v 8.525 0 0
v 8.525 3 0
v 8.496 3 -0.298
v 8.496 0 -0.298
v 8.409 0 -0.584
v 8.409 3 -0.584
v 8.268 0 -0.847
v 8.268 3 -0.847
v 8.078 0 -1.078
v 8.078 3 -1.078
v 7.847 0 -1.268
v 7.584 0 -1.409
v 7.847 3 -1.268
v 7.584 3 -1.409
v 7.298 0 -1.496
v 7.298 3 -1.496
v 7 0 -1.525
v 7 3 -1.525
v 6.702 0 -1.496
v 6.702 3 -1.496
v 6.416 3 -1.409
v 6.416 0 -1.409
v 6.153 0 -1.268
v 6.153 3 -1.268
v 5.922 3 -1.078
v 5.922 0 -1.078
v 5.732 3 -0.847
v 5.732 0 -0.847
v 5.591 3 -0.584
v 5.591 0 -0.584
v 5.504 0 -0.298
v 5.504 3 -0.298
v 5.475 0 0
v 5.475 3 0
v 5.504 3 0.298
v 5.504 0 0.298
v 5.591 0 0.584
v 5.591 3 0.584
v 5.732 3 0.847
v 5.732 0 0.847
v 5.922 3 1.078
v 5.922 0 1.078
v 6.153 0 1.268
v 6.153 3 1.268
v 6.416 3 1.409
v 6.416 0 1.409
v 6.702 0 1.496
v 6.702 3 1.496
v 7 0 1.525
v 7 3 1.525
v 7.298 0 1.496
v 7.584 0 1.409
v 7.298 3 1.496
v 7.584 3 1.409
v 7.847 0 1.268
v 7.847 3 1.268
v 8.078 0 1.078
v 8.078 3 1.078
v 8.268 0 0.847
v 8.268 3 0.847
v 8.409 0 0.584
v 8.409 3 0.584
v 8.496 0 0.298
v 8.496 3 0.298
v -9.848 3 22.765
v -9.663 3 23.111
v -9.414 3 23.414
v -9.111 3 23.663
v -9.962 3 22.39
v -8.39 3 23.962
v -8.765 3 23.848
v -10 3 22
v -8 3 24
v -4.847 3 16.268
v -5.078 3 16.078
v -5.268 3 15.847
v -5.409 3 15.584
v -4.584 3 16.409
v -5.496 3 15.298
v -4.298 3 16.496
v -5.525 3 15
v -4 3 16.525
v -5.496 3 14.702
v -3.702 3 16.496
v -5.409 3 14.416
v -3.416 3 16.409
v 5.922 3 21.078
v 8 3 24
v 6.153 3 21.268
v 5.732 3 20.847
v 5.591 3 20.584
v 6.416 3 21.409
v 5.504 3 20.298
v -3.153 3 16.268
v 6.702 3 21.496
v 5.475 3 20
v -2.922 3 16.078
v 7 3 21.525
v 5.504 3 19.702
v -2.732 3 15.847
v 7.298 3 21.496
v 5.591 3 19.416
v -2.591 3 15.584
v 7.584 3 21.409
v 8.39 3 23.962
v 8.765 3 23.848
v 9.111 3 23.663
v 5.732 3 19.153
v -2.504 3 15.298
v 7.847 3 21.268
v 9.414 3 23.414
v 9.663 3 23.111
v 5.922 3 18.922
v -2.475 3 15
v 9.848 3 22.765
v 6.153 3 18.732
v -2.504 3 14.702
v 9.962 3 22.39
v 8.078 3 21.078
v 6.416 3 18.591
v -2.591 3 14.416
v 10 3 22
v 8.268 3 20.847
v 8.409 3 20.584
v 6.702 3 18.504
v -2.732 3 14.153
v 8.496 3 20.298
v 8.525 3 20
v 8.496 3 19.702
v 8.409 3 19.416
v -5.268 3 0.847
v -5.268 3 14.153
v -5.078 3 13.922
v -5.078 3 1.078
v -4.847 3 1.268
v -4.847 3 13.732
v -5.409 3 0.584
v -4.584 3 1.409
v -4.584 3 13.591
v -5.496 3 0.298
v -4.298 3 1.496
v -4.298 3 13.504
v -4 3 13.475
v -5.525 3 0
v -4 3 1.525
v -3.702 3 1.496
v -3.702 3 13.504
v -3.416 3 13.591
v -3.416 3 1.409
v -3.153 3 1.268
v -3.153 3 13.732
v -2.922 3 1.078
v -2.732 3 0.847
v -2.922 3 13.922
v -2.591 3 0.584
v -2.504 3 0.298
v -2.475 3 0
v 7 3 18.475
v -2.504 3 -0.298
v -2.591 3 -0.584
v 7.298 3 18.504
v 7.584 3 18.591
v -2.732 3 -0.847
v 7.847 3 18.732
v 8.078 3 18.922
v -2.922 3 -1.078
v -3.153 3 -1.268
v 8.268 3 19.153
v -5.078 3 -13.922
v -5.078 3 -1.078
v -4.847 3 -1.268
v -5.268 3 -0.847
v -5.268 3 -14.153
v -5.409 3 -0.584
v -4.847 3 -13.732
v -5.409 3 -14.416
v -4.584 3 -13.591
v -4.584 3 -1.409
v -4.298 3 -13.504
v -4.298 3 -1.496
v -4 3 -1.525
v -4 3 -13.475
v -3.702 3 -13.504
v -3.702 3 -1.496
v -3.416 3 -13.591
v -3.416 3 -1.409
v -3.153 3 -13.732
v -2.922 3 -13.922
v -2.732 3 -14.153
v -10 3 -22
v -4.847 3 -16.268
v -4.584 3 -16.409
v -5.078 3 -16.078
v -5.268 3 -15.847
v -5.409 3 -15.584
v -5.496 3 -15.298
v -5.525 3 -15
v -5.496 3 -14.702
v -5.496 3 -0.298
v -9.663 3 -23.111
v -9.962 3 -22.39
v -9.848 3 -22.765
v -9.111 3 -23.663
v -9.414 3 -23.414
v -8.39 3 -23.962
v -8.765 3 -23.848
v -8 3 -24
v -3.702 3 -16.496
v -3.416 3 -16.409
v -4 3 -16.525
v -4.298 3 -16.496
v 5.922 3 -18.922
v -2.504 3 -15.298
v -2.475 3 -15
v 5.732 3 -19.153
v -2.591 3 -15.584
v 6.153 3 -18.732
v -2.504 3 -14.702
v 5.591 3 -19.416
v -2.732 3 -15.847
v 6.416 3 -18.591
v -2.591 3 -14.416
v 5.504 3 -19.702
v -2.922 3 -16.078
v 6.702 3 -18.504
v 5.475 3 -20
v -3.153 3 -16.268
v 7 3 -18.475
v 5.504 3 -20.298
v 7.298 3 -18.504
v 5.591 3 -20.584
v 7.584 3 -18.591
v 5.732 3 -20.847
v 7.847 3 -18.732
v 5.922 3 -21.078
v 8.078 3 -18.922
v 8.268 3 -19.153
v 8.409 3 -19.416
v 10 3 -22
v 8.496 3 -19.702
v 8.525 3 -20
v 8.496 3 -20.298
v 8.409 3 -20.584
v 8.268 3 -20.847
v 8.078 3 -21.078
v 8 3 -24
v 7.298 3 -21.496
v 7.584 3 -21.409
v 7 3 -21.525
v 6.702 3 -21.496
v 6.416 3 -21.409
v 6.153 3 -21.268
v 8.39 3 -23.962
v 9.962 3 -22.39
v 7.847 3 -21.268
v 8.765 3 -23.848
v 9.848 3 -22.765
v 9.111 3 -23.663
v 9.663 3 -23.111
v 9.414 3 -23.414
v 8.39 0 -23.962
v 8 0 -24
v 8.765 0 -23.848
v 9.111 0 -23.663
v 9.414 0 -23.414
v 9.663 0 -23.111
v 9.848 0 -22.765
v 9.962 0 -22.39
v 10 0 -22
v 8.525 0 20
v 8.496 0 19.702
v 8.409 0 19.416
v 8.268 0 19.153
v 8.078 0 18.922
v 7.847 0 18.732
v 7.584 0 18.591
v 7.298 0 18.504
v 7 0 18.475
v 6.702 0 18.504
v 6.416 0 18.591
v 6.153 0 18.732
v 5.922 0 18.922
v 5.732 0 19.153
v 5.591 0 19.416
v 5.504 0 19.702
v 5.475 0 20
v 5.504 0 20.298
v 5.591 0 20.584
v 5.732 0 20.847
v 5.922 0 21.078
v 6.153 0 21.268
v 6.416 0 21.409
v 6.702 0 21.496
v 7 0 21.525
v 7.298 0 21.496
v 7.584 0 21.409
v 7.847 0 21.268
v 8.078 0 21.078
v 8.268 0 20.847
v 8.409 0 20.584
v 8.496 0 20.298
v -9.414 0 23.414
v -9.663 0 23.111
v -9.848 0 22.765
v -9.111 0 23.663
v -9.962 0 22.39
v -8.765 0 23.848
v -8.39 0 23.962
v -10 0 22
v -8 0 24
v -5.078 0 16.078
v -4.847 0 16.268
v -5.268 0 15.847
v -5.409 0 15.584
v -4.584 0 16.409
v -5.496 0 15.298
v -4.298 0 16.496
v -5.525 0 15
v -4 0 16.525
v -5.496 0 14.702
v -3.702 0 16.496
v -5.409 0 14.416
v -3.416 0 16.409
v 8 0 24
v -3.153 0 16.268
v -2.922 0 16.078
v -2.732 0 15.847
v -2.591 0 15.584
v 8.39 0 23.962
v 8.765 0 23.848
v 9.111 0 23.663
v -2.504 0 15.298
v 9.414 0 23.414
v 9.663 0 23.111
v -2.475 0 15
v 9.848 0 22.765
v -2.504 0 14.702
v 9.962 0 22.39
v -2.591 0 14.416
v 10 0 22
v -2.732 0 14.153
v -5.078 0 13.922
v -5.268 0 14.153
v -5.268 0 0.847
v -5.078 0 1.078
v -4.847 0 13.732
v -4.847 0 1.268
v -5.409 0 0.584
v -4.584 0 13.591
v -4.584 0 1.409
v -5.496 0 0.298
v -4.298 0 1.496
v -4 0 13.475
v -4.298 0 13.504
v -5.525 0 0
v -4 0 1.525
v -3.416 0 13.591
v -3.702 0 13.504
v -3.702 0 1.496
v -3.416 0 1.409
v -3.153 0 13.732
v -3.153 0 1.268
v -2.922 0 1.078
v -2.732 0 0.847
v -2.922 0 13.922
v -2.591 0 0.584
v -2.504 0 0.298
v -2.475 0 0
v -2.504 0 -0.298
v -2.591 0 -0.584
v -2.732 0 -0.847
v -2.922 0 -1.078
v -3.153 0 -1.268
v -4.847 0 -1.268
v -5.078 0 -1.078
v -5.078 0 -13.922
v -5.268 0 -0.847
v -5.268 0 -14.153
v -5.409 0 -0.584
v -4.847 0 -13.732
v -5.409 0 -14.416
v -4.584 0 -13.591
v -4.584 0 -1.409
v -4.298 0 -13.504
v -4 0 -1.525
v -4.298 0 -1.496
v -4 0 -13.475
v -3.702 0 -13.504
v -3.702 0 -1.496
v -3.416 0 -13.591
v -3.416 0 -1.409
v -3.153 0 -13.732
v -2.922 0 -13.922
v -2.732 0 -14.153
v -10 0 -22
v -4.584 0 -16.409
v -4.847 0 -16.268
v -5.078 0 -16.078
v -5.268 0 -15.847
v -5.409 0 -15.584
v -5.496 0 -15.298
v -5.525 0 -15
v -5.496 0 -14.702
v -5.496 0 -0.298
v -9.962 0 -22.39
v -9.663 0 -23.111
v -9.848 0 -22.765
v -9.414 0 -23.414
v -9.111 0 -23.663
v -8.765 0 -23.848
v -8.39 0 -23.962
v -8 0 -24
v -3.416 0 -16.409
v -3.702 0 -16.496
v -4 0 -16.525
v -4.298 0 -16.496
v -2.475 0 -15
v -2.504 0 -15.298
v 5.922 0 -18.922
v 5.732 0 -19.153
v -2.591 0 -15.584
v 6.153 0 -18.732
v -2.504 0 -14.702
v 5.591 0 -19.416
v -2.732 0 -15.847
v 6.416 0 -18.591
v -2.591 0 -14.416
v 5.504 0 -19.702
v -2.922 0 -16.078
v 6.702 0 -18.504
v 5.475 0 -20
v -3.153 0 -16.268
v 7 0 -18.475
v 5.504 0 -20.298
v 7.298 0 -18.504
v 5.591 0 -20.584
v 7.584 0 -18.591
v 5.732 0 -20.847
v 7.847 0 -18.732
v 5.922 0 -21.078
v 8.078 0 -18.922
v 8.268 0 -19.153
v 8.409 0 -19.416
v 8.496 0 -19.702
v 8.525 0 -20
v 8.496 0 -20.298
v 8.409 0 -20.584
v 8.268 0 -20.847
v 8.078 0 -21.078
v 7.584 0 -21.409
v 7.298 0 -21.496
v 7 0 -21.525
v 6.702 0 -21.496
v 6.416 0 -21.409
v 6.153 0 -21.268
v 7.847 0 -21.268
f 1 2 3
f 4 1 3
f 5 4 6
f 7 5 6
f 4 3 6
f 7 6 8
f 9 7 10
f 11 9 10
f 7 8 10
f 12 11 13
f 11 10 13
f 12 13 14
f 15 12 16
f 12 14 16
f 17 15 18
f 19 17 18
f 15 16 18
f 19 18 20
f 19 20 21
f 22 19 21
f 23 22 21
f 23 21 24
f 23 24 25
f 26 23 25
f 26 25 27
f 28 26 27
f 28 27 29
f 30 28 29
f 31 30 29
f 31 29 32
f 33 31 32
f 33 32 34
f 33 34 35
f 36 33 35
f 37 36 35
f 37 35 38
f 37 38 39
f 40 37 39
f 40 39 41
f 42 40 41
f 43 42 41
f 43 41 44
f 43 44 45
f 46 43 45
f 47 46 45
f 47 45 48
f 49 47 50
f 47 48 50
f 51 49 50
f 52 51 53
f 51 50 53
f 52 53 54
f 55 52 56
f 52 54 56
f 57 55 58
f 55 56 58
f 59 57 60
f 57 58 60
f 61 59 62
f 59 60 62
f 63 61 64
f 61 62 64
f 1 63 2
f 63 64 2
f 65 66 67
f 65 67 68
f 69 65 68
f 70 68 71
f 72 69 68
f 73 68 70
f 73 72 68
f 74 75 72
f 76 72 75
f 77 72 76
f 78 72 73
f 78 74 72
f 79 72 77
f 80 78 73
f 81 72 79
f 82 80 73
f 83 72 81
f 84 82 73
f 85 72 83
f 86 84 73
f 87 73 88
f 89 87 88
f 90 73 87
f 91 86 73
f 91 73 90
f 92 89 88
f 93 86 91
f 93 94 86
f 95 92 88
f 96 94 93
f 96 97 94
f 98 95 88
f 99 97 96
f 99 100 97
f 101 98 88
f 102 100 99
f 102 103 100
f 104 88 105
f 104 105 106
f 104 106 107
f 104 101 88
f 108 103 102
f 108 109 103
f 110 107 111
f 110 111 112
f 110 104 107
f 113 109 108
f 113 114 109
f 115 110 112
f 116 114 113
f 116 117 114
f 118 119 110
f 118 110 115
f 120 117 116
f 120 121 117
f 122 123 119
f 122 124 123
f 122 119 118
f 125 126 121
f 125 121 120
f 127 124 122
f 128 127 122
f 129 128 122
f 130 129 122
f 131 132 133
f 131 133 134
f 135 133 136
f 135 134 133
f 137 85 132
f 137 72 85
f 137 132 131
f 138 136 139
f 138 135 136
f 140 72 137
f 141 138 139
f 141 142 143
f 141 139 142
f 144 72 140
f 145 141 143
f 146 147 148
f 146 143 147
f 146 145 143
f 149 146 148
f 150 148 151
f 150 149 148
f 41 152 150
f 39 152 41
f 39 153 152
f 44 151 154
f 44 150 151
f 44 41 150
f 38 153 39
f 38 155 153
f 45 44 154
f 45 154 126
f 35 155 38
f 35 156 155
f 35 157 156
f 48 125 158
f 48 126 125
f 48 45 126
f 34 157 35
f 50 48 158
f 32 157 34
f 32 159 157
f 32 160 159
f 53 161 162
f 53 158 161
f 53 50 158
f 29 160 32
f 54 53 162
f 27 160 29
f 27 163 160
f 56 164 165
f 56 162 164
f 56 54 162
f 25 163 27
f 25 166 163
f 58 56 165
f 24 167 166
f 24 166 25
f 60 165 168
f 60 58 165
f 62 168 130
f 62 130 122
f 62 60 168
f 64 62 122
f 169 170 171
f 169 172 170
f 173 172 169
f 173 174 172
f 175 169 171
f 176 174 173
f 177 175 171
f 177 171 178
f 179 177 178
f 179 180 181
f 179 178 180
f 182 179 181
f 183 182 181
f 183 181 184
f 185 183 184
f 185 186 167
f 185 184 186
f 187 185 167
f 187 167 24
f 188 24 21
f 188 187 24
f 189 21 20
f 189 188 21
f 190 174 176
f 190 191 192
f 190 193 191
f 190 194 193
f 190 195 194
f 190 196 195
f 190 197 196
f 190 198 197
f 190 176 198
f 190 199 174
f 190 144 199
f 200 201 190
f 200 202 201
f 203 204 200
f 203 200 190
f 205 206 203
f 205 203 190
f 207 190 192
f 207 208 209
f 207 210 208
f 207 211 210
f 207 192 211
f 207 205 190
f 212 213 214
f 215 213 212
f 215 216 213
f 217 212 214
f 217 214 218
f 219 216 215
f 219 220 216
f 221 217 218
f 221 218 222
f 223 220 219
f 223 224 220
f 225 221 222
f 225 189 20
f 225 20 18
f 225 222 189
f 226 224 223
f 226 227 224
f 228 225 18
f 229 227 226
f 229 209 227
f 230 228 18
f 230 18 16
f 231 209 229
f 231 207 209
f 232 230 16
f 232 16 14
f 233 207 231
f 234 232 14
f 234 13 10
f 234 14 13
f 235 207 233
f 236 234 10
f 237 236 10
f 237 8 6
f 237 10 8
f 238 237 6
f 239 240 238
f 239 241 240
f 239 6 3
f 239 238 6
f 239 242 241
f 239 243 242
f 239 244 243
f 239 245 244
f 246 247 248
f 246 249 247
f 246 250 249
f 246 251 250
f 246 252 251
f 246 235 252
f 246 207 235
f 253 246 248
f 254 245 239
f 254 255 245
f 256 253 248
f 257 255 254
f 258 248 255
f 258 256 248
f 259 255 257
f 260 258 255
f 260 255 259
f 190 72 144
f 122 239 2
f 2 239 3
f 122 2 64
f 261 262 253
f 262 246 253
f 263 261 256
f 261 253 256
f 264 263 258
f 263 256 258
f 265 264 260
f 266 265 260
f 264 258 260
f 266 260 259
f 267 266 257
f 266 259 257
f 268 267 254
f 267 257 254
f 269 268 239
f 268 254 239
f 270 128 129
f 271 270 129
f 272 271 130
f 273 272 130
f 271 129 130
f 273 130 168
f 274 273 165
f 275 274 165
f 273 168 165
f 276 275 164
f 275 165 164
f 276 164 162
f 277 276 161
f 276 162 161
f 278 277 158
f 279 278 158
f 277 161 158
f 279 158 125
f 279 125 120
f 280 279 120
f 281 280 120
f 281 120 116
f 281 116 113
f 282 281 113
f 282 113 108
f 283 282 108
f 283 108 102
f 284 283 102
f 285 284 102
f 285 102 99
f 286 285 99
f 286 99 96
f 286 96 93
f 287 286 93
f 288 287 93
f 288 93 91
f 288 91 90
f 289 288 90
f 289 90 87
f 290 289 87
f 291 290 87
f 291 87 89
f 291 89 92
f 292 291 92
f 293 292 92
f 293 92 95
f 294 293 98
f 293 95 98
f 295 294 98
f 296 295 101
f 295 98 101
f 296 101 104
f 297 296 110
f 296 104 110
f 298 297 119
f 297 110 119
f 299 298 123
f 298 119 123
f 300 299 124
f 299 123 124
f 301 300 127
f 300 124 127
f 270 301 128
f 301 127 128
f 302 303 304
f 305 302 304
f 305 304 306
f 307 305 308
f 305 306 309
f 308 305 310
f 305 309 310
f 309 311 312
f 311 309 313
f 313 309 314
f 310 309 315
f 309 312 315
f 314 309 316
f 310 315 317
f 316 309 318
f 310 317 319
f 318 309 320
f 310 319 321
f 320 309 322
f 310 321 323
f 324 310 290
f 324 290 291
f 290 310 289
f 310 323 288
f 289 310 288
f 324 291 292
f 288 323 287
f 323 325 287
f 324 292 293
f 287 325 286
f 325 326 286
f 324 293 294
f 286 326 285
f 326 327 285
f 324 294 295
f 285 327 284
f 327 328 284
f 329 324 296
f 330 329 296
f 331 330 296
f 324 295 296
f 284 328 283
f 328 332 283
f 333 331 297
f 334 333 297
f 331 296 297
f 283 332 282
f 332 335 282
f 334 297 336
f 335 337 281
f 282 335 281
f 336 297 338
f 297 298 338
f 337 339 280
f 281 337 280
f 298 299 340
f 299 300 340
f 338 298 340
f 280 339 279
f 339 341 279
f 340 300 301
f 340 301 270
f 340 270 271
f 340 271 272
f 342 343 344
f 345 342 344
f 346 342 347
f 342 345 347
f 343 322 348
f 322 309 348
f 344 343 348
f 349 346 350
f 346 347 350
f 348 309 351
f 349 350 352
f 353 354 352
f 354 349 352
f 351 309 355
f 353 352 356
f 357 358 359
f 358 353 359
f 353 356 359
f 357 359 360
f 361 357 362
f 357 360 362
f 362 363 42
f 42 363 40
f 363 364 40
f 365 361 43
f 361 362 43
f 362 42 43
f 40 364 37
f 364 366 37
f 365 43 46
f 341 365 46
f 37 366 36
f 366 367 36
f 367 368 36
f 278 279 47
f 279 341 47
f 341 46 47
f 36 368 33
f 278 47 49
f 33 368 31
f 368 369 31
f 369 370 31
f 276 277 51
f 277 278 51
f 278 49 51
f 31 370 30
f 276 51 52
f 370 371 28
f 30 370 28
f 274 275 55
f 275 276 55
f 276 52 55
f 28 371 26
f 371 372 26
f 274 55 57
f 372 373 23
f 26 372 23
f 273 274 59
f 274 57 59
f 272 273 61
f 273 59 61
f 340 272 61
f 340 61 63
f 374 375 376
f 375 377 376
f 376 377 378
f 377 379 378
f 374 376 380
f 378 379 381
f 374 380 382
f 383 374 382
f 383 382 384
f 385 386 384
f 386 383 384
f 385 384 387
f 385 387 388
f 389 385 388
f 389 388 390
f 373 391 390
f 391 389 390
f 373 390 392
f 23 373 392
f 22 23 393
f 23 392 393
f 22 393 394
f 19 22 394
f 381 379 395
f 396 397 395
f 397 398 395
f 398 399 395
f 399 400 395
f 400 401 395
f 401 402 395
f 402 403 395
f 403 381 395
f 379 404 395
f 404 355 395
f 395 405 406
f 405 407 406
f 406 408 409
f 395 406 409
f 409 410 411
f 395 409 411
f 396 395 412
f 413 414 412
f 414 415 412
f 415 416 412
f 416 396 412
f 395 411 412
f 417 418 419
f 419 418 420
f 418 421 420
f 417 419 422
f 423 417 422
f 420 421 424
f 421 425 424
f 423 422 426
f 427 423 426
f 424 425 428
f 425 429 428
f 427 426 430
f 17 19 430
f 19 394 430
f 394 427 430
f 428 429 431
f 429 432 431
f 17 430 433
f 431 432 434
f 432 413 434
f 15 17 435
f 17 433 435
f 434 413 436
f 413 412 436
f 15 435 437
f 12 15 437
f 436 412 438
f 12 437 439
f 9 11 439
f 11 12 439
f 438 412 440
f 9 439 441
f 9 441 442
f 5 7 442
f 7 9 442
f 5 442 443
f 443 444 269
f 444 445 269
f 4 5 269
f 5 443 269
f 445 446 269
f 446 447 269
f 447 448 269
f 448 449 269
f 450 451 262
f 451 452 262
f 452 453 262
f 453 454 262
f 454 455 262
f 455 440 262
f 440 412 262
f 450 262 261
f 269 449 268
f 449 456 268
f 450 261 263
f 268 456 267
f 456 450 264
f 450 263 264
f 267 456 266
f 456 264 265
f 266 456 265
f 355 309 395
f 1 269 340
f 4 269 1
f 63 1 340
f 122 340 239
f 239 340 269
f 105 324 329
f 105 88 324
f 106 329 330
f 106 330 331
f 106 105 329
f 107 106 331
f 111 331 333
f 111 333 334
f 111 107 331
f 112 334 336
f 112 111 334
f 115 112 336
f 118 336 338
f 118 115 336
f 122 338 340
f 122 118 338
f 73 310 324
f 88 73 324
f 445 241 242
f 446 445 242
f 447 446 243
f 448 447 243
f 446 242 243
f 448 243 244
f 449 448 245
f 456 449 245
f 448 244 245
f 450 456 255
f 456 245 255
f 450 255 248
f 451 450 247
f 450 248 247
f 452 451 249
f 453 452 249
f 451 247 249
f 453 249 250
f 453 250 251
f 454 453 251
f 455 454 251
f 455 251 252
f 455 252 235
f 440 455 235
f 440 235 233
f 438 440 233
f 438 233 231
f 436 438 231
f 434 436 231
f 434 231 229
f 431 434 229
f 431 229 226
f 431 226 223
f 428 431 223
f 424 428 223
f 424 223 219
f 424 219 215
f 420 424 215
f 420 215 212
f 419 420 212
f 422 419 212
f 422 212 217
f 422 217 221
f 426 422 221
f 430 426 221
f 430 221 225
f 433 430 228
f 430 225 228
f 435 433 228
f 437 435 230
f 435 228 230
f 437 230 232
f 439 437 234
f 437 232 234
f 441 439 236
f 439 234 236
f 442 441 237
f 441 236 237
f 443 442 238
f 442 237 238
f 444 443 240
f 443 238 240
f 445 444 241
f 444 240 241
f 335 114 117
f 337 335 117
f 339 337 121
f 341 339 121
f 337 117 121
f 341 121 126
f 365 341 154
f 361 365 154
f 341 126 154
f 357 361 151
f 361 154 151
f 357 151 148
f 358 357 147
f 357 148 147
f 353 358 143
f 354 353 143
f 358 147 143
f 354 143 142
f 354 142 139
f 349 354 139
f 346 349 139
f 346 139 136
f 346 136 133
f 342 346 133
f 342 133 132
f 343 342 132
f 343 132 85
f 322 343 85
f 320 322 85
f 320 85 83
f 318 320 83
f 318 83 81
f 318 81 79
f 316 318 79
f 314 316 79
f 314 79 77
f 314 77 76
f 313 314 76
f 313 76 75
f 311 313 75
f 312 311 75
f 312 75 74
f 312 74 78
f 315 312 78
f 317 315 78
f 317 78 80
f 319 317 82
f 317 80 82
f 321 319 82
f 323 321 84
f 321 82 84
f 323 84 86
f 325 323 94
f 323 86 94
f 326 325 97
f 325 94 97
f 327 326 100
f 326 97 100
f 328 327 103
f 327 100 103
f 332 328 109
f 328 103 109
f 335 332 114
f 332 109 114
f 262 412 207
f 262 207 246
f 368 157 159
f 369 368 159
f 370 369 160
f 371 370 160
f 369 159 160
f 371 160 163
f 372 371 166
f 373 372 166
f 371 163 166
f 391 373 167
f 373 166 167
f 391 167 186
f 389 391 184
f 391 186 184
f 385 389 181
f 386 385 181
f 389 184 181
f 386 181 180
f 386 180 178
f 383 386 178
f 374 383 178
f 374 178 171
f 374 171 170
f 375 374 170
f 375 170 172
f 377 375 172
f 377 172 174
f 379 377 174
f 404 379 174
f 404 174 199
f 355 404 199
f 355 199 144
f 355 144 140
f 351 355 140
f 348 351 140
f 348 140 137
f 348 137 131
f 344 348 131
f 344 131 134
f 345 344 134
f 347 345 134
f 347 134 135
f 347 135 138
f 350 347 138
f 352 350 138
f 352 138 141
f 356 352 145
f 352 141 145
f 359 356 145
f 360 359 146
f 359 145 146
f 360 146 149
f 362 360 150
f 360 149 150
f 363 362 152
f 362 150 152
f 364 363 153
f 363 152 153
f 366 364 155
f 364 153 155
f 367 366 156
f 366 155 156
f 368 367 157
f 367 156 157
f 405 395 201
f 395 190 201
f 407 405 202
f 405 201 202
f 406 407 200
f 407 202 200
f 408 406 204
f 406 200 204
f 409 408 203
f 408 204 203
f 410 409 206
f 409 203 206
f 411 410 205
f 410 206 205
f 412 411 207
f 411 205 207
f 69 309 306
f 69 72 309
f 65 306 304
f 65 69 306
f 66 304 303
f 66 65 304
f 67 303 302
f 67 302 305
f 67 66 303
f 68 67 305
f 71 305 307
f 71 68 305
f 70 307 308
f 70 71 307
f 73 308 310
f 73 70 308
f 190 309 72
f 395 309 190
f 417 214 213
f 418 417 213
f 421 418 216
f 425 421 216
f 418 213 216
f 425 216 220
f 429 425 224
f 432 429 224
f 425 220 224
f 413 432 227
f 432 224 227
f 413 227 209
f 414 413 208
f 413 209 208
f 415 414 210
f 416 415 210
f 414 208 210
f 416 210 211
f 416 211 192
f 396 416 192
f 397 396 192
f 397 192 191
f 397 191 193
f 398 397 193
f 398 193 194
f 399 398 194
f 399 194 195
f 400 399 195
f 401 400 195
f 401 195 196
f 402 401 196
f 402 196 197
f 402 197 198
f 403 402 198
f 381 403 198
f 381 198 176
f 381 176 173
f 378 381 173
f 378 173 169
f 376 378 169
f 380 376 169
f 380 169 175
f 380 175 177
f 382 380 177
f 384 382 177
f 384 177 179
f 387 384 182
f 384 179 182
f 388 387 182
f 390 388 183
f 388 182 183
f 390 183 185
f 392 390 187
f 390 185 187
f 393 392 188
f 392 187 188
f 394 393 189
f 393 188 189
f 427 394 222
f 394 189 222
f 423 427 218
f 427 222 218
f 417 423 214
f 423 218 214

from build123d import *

# Parameters (mm, degrees)
SKETCH_1_W          = 20
SKETCH_1_H          = 48
EXTRUDE_1_DEPTH     = 3
SKETCH_2_R          = 1.525
CUT_EXTRUDE_1_DEPTH = 4
FILLET_1_R          = 2


with BuildPart() as part:
    # 草图1 → 凸台-拉伸1 (new body)
    with BuildSketch(Plane(origin=(0, 0, 0), x_dir=(1, 0, 0), z_dir=(0, 1, 0))):
        Rectangle(SKETCH_1_W, SKETCH_1_H)
    extrude(amount=EXTRUDE_1_DEPTH)

    # 草图2 → 切除-拉伸1 (cut, through all)
    with BuildSketch(Plane(origin=(0, 3, 0), x_dir=(1, 0, 0), z_dir=(0, 1, 0))):
        with Locations((7, 0)):
            Circle(SKETCH_2_R)
        with Locations((7, 20)):
            Circle(SKETCH_2_R)
        with Locations((-4, 0)):
            Circle(SKETCH_2_R)
        with Locations((-4, 15)):
            Circle(SKETCH_2_R)
        with Locations((7, -20)):
            Circle(SKETCH_2_R)
        with Locations((-4, -15)):
            Circle(SKETCH_2_R)
    extrude(amount=-CUT_EXTRUDE_1_DEPTH, mode=Mode.SUBTRACT)

    # 圆角1
    fillet_1_edges = [part.edges().sort_by_distance(p)[0] for p in [
        (10, 1.5, 24),
        (-10, 1.5, 24),
        (-10, 1.5, -24),
        (10, 1.5, -24),
    ]]
    fillet(fillet_1_edges, radius=FILLET_1_R)


solid = part.part
